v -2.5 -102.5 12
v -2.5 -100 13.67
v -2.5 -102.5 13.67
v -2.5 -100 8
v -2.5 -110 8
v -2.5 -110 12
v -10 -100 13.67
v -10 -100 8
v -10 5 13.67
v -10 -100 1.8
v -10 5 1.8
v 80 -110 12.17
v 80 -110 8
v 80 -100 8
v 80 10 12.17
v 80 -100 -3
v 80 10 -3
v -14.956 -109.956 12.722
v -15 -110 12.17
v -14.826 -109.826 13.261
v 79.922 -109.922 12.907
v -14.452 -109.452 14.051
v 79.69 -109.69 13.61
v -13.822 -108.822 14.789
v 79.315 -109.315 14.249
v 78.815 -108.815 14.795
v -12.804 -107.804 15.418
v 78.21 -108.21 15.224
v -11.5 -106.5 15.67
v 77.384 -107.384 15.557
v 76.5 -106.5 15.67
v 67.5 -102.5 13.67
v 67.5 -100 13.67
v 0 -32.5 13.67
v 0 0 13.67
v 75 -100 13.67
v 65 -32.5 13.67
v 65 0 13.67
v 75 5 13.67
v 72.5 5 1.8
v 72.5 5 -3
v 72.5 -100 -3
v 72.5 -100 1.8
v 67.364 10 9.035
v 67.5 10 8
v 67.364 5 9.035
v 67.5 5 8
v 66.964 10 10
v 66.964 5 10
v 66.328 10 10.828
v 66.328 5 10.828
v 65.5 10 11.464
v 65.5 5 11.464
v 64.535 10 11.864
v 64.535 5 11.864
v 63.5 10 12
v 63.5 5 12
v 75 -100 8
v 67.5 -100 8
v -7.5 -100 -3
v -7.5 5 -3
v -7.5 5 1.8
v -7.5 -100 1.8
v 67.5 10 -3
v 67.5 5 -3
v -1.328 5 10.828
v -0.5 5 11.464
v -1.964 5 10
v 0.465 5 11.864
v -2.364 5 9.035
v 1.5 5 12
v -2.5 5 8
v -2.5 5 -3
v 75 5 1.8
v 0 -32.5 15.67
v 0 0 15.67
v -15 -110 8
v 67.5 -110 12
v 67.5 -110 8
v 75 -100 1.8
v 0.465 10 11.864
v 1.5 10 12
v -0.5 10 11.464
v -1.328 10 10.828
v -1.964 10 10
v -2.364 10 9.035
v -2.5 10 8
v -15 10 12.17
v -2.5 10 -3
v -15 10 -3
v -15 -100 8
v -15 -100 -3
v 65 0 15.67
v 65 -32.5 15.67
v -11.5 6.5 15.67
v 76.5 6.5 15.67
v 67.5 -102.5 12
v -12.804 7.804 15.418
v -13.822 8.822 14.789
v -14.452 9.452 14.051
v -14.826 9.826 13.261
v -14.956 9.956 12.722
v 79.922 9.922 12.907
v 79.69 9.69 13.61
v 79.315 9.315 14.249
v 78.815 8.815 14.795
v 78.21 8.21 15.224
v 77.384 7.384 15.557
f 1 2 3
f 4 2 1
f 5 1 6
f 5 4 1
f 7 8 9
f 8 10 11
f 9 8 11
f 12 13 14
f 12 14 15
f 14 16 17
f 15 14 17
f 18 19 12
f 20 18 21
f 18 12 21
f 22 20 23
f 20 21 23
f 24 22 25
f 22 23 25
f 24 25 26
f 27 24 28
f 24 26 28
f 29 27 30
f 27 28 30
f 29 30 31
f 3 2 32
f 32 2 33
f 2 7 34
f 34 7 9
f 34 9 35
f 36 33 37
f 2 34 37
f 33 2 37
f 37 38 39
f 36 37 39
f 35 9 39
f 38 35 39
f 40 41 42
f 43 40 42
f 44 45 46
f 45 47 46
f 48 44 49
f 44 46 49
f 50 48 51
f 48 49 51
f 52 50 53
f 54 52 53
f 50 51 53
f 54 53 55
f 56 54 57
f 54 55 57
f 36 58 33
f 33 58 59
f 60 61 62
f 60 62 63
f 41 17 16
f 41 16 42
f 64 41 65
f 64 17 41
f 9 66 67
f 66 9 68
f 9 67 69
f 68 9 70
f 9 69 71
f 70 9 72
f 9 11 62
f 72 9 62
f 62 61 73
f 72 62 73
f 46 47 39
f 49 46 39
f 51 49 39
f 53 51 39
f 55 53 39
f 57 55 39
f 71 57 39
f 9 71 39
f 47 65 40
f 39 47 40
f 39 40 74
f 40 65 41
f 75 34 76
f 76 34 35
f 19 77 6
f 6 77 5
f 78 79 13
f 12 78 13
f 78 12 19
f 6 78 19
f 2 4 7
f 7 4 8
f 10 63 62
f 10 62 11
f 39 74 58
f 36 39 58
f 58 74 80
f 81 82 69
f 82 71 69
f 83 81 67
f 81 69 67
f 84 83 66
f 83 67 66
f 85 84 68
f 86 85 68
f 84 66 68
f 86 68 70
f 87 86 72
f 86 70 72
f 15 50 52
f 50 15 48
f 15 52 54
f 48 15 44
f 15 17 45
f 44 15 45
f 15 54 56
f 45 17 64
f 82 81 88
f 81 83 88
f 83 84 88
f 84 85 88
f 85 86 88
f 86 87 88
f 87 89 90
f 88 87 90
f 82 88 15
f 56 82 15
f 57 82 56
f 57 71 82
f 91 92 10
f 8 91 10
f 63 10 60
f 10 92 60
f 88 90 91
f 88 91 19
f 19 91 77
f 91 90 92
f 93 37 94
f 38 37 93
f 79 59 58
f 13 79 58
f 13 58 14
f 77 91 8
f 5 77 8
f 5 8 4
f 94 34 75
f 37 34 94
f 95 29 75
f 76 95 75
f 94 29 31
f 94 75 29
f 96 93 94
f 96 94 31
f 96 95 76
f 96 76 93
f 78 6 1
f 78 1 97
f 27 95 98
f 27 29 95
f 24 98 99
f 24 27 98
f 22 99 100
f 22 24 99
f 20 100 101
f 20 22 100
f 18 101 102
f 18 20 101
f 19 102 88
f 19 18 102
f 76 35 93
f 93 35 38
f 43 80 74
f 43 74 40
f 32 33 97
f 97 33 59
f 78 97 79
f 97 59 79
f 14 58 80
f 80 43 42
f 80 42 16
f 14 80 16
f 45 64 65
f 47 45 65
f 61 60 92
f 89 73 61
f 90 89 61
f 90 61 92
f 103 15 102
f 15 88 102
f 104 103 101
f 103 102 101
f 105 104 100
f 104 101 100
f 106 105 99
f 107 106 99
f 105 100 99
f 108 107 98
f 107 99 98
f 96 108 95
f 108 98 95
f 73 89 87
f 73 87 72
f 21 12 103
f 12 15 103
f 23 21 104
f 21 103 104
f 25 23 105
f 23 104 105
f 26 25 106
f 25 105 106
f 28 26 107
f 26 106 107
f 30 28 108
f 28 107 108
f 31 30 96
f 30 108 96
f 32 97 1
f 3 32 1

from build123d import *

# Parameters (mm, degrees)
PAD008_DEPTH    = 4.8
SKETCH012_W     = 5
SKETCH012_H     = 110
SKETCH012_H_2   = 105
SKETCH012_W_2   = 90
SKETCH012_H_3   = 5
PAD009_DEPTH    = 0.2
PAD010_DEPTH    = 6
SKETCH024_W     = 95
SKETCH024_H     = 120
PAD021_DEPTH    = 5.67
SKETCH025_W     = 65
SKETCH025_H     = 32.5
PAD022_DEPTH    = 2
FILLET004_R     = 3.5
SKETCH029_W     = 1.25
SKETCH029_H     = 105
POCKET006_DEPTH = 5
SKETCH030_W     = 70
SKETCH030_H     = 5
POCKET007_DEPTH = 15
FILLET006_R     = 4
SKETCH032_W     = 70
SKETCH032_H     = 7.5
POCKET008_DEPTH = 4


with BuildPart() as part:
    # Sketch011 → Pad008 (new body)
    with BuildSketch(Plane.XY):
        Polygon((0, 0), (95, 0), (95, -5), (95, -110), (86.25, -110), (86.25, -5), (8.75, -5), (8.75, -110), (0, -110), (0, -5), align=None)
    extrude(amount=PAD008_DEPTH)

    # Sketch012 (on Face12 of Pad008) → Pad009 (join)
    with BuildSketch(Plane.XY.offset(4.8)):
        with Locations((2.5, -55)):
            Rectangle(SKETCH012_W, SKETCH012_H)
        with Locations((92.5, -57.5)):
            Rectangle(SKETCH012_W, SKETCH012_H_2)
        with Locations((50, -2.5)):
            Rectangle(SKETCH012_W_2, SKETCH012_H_3)
    extrude(amount=PAD009_DEPTH)

    # Pad009 Face16 → Pad010 (add)
    with BuildSketch(Plane(origin=(47.5, -40.368852, 5), x_dir=(0, 1, 0), z_dir=(0, 0, 1))):
        Polygon((40.368852, 42.5), (40.368852, 47.5), (-69.631148, 47.5), (-69.631148, 42.5), (35.368852, 42.5), (35.368852, -42.5), (-69.631148, -42.5), (-69.631148, -47.5), (35.368852, -47.5), (40.368852, -47.5), align=None)
    extrude(amount=PAD010_DEPTH)

    # Sketch024 (on Face27 of Pad010) → Pad021 (join)
    with BuildSketch(Plane.XY.offset(11)):
        with Locations((47.5, -60)):
            Rectangle(SKETCH024_W, SKETCH024_H)
        Polygon((5, -5), (90, -5), (90, -110), (82.5, -110), (82.5, -112.5), (12.5, -112.5), (12.5, -110), (5, -110), align=None, mode=Mode.SUBTRACT)
    extrude(amount=PAD021_DEPTH)

    # Sketch025 (on Face37 of Pad021) → Pad022 (join)
    with BuildSketch(Plane.XY.offset(16.67)):
        Polygon((0, -120), (95, -120), (95, -42.5), (95, -10), (95, 0), (15, 0), (0, 0), (0, -42.5), align=None)
        with Locations((47.5, -26.25)):
            Rectangle(SKETCH025_W, SKETCH025_H, mode=Mode.SUBTRACT)
    extrude(amount=PAD022_DEPTH)

    # Fillet004
    fillet004_edges = [part.edges().sort_by_distance(p)[0] for p in [
        (0, -81.25, 18.67),
        (47.5, -120, 18.67),
        (55, 0, 18.67),
        (95, -81.25, 18.67),
    ]]
    fillet(fillet004_edges, radius=FILLET004_R)

    # Sketch029 (on Face48 of Fillet004) → Pocket006 (cut)
    with BuildSketch(Plane(origin=(0, 0, 0), x_dir=(1, 0, 0), z_dir=(0, 0, -1))):
        with Locations((8.125, 57.5)):
            Rectangle(SKETCH029_W, SKETCH029_H)
        with Locations((86.875, 57.5)):
            Rectangle(SKETCH029_W, SKETCH029_H)
    extrude(amount=-POCKET006_DEPTH, mode=Mode.SUBTRACT)

    # Sketch030 (on Face48 of Pocket006) → Pocket007 (cut)
    with BuildSketch(Plane(origin=(0, 0, 0), x_dir=(1, 0, 0), z_dir=(0, 0, -1))):
        with Locations((47.5, 2.5)):
            Rectangle(SKETCH030_W, SKETCH030_H)
    extrude(amount=-POCKET007_DEPTH, mode=Mode.SUBTRACT)

    # Fillet006
    fillet006_edges = [part.edges().sort_by_distance(p)[0] for p in [
        (12.5, -2.5, 15),
        (82.5, -2.5, 15),
    ]]
    fillet(fillet006_edges, radius=FILLET006_R)

    # Sketch032 (on Face20 of Fillet006) → Pocket008 (cut)
    with BuildSketch(Plane(origin=(0, 0, 11), x_dir=(1, 0, 0), z_dir=(0, 0, -1))):
        with Locations((47.5, 116.25)):
            Rectangle(SKETCH032_W, SKETCH032_H)
    extrude(amount=-POCKET008_DEPTH, mode=Mode.SUBTRACT)


with BuildPart() as part_1:
    # Body001 placement: moved
    add(part.part.moved(Location((-15, 10, -3))))


solid = part_1.part
